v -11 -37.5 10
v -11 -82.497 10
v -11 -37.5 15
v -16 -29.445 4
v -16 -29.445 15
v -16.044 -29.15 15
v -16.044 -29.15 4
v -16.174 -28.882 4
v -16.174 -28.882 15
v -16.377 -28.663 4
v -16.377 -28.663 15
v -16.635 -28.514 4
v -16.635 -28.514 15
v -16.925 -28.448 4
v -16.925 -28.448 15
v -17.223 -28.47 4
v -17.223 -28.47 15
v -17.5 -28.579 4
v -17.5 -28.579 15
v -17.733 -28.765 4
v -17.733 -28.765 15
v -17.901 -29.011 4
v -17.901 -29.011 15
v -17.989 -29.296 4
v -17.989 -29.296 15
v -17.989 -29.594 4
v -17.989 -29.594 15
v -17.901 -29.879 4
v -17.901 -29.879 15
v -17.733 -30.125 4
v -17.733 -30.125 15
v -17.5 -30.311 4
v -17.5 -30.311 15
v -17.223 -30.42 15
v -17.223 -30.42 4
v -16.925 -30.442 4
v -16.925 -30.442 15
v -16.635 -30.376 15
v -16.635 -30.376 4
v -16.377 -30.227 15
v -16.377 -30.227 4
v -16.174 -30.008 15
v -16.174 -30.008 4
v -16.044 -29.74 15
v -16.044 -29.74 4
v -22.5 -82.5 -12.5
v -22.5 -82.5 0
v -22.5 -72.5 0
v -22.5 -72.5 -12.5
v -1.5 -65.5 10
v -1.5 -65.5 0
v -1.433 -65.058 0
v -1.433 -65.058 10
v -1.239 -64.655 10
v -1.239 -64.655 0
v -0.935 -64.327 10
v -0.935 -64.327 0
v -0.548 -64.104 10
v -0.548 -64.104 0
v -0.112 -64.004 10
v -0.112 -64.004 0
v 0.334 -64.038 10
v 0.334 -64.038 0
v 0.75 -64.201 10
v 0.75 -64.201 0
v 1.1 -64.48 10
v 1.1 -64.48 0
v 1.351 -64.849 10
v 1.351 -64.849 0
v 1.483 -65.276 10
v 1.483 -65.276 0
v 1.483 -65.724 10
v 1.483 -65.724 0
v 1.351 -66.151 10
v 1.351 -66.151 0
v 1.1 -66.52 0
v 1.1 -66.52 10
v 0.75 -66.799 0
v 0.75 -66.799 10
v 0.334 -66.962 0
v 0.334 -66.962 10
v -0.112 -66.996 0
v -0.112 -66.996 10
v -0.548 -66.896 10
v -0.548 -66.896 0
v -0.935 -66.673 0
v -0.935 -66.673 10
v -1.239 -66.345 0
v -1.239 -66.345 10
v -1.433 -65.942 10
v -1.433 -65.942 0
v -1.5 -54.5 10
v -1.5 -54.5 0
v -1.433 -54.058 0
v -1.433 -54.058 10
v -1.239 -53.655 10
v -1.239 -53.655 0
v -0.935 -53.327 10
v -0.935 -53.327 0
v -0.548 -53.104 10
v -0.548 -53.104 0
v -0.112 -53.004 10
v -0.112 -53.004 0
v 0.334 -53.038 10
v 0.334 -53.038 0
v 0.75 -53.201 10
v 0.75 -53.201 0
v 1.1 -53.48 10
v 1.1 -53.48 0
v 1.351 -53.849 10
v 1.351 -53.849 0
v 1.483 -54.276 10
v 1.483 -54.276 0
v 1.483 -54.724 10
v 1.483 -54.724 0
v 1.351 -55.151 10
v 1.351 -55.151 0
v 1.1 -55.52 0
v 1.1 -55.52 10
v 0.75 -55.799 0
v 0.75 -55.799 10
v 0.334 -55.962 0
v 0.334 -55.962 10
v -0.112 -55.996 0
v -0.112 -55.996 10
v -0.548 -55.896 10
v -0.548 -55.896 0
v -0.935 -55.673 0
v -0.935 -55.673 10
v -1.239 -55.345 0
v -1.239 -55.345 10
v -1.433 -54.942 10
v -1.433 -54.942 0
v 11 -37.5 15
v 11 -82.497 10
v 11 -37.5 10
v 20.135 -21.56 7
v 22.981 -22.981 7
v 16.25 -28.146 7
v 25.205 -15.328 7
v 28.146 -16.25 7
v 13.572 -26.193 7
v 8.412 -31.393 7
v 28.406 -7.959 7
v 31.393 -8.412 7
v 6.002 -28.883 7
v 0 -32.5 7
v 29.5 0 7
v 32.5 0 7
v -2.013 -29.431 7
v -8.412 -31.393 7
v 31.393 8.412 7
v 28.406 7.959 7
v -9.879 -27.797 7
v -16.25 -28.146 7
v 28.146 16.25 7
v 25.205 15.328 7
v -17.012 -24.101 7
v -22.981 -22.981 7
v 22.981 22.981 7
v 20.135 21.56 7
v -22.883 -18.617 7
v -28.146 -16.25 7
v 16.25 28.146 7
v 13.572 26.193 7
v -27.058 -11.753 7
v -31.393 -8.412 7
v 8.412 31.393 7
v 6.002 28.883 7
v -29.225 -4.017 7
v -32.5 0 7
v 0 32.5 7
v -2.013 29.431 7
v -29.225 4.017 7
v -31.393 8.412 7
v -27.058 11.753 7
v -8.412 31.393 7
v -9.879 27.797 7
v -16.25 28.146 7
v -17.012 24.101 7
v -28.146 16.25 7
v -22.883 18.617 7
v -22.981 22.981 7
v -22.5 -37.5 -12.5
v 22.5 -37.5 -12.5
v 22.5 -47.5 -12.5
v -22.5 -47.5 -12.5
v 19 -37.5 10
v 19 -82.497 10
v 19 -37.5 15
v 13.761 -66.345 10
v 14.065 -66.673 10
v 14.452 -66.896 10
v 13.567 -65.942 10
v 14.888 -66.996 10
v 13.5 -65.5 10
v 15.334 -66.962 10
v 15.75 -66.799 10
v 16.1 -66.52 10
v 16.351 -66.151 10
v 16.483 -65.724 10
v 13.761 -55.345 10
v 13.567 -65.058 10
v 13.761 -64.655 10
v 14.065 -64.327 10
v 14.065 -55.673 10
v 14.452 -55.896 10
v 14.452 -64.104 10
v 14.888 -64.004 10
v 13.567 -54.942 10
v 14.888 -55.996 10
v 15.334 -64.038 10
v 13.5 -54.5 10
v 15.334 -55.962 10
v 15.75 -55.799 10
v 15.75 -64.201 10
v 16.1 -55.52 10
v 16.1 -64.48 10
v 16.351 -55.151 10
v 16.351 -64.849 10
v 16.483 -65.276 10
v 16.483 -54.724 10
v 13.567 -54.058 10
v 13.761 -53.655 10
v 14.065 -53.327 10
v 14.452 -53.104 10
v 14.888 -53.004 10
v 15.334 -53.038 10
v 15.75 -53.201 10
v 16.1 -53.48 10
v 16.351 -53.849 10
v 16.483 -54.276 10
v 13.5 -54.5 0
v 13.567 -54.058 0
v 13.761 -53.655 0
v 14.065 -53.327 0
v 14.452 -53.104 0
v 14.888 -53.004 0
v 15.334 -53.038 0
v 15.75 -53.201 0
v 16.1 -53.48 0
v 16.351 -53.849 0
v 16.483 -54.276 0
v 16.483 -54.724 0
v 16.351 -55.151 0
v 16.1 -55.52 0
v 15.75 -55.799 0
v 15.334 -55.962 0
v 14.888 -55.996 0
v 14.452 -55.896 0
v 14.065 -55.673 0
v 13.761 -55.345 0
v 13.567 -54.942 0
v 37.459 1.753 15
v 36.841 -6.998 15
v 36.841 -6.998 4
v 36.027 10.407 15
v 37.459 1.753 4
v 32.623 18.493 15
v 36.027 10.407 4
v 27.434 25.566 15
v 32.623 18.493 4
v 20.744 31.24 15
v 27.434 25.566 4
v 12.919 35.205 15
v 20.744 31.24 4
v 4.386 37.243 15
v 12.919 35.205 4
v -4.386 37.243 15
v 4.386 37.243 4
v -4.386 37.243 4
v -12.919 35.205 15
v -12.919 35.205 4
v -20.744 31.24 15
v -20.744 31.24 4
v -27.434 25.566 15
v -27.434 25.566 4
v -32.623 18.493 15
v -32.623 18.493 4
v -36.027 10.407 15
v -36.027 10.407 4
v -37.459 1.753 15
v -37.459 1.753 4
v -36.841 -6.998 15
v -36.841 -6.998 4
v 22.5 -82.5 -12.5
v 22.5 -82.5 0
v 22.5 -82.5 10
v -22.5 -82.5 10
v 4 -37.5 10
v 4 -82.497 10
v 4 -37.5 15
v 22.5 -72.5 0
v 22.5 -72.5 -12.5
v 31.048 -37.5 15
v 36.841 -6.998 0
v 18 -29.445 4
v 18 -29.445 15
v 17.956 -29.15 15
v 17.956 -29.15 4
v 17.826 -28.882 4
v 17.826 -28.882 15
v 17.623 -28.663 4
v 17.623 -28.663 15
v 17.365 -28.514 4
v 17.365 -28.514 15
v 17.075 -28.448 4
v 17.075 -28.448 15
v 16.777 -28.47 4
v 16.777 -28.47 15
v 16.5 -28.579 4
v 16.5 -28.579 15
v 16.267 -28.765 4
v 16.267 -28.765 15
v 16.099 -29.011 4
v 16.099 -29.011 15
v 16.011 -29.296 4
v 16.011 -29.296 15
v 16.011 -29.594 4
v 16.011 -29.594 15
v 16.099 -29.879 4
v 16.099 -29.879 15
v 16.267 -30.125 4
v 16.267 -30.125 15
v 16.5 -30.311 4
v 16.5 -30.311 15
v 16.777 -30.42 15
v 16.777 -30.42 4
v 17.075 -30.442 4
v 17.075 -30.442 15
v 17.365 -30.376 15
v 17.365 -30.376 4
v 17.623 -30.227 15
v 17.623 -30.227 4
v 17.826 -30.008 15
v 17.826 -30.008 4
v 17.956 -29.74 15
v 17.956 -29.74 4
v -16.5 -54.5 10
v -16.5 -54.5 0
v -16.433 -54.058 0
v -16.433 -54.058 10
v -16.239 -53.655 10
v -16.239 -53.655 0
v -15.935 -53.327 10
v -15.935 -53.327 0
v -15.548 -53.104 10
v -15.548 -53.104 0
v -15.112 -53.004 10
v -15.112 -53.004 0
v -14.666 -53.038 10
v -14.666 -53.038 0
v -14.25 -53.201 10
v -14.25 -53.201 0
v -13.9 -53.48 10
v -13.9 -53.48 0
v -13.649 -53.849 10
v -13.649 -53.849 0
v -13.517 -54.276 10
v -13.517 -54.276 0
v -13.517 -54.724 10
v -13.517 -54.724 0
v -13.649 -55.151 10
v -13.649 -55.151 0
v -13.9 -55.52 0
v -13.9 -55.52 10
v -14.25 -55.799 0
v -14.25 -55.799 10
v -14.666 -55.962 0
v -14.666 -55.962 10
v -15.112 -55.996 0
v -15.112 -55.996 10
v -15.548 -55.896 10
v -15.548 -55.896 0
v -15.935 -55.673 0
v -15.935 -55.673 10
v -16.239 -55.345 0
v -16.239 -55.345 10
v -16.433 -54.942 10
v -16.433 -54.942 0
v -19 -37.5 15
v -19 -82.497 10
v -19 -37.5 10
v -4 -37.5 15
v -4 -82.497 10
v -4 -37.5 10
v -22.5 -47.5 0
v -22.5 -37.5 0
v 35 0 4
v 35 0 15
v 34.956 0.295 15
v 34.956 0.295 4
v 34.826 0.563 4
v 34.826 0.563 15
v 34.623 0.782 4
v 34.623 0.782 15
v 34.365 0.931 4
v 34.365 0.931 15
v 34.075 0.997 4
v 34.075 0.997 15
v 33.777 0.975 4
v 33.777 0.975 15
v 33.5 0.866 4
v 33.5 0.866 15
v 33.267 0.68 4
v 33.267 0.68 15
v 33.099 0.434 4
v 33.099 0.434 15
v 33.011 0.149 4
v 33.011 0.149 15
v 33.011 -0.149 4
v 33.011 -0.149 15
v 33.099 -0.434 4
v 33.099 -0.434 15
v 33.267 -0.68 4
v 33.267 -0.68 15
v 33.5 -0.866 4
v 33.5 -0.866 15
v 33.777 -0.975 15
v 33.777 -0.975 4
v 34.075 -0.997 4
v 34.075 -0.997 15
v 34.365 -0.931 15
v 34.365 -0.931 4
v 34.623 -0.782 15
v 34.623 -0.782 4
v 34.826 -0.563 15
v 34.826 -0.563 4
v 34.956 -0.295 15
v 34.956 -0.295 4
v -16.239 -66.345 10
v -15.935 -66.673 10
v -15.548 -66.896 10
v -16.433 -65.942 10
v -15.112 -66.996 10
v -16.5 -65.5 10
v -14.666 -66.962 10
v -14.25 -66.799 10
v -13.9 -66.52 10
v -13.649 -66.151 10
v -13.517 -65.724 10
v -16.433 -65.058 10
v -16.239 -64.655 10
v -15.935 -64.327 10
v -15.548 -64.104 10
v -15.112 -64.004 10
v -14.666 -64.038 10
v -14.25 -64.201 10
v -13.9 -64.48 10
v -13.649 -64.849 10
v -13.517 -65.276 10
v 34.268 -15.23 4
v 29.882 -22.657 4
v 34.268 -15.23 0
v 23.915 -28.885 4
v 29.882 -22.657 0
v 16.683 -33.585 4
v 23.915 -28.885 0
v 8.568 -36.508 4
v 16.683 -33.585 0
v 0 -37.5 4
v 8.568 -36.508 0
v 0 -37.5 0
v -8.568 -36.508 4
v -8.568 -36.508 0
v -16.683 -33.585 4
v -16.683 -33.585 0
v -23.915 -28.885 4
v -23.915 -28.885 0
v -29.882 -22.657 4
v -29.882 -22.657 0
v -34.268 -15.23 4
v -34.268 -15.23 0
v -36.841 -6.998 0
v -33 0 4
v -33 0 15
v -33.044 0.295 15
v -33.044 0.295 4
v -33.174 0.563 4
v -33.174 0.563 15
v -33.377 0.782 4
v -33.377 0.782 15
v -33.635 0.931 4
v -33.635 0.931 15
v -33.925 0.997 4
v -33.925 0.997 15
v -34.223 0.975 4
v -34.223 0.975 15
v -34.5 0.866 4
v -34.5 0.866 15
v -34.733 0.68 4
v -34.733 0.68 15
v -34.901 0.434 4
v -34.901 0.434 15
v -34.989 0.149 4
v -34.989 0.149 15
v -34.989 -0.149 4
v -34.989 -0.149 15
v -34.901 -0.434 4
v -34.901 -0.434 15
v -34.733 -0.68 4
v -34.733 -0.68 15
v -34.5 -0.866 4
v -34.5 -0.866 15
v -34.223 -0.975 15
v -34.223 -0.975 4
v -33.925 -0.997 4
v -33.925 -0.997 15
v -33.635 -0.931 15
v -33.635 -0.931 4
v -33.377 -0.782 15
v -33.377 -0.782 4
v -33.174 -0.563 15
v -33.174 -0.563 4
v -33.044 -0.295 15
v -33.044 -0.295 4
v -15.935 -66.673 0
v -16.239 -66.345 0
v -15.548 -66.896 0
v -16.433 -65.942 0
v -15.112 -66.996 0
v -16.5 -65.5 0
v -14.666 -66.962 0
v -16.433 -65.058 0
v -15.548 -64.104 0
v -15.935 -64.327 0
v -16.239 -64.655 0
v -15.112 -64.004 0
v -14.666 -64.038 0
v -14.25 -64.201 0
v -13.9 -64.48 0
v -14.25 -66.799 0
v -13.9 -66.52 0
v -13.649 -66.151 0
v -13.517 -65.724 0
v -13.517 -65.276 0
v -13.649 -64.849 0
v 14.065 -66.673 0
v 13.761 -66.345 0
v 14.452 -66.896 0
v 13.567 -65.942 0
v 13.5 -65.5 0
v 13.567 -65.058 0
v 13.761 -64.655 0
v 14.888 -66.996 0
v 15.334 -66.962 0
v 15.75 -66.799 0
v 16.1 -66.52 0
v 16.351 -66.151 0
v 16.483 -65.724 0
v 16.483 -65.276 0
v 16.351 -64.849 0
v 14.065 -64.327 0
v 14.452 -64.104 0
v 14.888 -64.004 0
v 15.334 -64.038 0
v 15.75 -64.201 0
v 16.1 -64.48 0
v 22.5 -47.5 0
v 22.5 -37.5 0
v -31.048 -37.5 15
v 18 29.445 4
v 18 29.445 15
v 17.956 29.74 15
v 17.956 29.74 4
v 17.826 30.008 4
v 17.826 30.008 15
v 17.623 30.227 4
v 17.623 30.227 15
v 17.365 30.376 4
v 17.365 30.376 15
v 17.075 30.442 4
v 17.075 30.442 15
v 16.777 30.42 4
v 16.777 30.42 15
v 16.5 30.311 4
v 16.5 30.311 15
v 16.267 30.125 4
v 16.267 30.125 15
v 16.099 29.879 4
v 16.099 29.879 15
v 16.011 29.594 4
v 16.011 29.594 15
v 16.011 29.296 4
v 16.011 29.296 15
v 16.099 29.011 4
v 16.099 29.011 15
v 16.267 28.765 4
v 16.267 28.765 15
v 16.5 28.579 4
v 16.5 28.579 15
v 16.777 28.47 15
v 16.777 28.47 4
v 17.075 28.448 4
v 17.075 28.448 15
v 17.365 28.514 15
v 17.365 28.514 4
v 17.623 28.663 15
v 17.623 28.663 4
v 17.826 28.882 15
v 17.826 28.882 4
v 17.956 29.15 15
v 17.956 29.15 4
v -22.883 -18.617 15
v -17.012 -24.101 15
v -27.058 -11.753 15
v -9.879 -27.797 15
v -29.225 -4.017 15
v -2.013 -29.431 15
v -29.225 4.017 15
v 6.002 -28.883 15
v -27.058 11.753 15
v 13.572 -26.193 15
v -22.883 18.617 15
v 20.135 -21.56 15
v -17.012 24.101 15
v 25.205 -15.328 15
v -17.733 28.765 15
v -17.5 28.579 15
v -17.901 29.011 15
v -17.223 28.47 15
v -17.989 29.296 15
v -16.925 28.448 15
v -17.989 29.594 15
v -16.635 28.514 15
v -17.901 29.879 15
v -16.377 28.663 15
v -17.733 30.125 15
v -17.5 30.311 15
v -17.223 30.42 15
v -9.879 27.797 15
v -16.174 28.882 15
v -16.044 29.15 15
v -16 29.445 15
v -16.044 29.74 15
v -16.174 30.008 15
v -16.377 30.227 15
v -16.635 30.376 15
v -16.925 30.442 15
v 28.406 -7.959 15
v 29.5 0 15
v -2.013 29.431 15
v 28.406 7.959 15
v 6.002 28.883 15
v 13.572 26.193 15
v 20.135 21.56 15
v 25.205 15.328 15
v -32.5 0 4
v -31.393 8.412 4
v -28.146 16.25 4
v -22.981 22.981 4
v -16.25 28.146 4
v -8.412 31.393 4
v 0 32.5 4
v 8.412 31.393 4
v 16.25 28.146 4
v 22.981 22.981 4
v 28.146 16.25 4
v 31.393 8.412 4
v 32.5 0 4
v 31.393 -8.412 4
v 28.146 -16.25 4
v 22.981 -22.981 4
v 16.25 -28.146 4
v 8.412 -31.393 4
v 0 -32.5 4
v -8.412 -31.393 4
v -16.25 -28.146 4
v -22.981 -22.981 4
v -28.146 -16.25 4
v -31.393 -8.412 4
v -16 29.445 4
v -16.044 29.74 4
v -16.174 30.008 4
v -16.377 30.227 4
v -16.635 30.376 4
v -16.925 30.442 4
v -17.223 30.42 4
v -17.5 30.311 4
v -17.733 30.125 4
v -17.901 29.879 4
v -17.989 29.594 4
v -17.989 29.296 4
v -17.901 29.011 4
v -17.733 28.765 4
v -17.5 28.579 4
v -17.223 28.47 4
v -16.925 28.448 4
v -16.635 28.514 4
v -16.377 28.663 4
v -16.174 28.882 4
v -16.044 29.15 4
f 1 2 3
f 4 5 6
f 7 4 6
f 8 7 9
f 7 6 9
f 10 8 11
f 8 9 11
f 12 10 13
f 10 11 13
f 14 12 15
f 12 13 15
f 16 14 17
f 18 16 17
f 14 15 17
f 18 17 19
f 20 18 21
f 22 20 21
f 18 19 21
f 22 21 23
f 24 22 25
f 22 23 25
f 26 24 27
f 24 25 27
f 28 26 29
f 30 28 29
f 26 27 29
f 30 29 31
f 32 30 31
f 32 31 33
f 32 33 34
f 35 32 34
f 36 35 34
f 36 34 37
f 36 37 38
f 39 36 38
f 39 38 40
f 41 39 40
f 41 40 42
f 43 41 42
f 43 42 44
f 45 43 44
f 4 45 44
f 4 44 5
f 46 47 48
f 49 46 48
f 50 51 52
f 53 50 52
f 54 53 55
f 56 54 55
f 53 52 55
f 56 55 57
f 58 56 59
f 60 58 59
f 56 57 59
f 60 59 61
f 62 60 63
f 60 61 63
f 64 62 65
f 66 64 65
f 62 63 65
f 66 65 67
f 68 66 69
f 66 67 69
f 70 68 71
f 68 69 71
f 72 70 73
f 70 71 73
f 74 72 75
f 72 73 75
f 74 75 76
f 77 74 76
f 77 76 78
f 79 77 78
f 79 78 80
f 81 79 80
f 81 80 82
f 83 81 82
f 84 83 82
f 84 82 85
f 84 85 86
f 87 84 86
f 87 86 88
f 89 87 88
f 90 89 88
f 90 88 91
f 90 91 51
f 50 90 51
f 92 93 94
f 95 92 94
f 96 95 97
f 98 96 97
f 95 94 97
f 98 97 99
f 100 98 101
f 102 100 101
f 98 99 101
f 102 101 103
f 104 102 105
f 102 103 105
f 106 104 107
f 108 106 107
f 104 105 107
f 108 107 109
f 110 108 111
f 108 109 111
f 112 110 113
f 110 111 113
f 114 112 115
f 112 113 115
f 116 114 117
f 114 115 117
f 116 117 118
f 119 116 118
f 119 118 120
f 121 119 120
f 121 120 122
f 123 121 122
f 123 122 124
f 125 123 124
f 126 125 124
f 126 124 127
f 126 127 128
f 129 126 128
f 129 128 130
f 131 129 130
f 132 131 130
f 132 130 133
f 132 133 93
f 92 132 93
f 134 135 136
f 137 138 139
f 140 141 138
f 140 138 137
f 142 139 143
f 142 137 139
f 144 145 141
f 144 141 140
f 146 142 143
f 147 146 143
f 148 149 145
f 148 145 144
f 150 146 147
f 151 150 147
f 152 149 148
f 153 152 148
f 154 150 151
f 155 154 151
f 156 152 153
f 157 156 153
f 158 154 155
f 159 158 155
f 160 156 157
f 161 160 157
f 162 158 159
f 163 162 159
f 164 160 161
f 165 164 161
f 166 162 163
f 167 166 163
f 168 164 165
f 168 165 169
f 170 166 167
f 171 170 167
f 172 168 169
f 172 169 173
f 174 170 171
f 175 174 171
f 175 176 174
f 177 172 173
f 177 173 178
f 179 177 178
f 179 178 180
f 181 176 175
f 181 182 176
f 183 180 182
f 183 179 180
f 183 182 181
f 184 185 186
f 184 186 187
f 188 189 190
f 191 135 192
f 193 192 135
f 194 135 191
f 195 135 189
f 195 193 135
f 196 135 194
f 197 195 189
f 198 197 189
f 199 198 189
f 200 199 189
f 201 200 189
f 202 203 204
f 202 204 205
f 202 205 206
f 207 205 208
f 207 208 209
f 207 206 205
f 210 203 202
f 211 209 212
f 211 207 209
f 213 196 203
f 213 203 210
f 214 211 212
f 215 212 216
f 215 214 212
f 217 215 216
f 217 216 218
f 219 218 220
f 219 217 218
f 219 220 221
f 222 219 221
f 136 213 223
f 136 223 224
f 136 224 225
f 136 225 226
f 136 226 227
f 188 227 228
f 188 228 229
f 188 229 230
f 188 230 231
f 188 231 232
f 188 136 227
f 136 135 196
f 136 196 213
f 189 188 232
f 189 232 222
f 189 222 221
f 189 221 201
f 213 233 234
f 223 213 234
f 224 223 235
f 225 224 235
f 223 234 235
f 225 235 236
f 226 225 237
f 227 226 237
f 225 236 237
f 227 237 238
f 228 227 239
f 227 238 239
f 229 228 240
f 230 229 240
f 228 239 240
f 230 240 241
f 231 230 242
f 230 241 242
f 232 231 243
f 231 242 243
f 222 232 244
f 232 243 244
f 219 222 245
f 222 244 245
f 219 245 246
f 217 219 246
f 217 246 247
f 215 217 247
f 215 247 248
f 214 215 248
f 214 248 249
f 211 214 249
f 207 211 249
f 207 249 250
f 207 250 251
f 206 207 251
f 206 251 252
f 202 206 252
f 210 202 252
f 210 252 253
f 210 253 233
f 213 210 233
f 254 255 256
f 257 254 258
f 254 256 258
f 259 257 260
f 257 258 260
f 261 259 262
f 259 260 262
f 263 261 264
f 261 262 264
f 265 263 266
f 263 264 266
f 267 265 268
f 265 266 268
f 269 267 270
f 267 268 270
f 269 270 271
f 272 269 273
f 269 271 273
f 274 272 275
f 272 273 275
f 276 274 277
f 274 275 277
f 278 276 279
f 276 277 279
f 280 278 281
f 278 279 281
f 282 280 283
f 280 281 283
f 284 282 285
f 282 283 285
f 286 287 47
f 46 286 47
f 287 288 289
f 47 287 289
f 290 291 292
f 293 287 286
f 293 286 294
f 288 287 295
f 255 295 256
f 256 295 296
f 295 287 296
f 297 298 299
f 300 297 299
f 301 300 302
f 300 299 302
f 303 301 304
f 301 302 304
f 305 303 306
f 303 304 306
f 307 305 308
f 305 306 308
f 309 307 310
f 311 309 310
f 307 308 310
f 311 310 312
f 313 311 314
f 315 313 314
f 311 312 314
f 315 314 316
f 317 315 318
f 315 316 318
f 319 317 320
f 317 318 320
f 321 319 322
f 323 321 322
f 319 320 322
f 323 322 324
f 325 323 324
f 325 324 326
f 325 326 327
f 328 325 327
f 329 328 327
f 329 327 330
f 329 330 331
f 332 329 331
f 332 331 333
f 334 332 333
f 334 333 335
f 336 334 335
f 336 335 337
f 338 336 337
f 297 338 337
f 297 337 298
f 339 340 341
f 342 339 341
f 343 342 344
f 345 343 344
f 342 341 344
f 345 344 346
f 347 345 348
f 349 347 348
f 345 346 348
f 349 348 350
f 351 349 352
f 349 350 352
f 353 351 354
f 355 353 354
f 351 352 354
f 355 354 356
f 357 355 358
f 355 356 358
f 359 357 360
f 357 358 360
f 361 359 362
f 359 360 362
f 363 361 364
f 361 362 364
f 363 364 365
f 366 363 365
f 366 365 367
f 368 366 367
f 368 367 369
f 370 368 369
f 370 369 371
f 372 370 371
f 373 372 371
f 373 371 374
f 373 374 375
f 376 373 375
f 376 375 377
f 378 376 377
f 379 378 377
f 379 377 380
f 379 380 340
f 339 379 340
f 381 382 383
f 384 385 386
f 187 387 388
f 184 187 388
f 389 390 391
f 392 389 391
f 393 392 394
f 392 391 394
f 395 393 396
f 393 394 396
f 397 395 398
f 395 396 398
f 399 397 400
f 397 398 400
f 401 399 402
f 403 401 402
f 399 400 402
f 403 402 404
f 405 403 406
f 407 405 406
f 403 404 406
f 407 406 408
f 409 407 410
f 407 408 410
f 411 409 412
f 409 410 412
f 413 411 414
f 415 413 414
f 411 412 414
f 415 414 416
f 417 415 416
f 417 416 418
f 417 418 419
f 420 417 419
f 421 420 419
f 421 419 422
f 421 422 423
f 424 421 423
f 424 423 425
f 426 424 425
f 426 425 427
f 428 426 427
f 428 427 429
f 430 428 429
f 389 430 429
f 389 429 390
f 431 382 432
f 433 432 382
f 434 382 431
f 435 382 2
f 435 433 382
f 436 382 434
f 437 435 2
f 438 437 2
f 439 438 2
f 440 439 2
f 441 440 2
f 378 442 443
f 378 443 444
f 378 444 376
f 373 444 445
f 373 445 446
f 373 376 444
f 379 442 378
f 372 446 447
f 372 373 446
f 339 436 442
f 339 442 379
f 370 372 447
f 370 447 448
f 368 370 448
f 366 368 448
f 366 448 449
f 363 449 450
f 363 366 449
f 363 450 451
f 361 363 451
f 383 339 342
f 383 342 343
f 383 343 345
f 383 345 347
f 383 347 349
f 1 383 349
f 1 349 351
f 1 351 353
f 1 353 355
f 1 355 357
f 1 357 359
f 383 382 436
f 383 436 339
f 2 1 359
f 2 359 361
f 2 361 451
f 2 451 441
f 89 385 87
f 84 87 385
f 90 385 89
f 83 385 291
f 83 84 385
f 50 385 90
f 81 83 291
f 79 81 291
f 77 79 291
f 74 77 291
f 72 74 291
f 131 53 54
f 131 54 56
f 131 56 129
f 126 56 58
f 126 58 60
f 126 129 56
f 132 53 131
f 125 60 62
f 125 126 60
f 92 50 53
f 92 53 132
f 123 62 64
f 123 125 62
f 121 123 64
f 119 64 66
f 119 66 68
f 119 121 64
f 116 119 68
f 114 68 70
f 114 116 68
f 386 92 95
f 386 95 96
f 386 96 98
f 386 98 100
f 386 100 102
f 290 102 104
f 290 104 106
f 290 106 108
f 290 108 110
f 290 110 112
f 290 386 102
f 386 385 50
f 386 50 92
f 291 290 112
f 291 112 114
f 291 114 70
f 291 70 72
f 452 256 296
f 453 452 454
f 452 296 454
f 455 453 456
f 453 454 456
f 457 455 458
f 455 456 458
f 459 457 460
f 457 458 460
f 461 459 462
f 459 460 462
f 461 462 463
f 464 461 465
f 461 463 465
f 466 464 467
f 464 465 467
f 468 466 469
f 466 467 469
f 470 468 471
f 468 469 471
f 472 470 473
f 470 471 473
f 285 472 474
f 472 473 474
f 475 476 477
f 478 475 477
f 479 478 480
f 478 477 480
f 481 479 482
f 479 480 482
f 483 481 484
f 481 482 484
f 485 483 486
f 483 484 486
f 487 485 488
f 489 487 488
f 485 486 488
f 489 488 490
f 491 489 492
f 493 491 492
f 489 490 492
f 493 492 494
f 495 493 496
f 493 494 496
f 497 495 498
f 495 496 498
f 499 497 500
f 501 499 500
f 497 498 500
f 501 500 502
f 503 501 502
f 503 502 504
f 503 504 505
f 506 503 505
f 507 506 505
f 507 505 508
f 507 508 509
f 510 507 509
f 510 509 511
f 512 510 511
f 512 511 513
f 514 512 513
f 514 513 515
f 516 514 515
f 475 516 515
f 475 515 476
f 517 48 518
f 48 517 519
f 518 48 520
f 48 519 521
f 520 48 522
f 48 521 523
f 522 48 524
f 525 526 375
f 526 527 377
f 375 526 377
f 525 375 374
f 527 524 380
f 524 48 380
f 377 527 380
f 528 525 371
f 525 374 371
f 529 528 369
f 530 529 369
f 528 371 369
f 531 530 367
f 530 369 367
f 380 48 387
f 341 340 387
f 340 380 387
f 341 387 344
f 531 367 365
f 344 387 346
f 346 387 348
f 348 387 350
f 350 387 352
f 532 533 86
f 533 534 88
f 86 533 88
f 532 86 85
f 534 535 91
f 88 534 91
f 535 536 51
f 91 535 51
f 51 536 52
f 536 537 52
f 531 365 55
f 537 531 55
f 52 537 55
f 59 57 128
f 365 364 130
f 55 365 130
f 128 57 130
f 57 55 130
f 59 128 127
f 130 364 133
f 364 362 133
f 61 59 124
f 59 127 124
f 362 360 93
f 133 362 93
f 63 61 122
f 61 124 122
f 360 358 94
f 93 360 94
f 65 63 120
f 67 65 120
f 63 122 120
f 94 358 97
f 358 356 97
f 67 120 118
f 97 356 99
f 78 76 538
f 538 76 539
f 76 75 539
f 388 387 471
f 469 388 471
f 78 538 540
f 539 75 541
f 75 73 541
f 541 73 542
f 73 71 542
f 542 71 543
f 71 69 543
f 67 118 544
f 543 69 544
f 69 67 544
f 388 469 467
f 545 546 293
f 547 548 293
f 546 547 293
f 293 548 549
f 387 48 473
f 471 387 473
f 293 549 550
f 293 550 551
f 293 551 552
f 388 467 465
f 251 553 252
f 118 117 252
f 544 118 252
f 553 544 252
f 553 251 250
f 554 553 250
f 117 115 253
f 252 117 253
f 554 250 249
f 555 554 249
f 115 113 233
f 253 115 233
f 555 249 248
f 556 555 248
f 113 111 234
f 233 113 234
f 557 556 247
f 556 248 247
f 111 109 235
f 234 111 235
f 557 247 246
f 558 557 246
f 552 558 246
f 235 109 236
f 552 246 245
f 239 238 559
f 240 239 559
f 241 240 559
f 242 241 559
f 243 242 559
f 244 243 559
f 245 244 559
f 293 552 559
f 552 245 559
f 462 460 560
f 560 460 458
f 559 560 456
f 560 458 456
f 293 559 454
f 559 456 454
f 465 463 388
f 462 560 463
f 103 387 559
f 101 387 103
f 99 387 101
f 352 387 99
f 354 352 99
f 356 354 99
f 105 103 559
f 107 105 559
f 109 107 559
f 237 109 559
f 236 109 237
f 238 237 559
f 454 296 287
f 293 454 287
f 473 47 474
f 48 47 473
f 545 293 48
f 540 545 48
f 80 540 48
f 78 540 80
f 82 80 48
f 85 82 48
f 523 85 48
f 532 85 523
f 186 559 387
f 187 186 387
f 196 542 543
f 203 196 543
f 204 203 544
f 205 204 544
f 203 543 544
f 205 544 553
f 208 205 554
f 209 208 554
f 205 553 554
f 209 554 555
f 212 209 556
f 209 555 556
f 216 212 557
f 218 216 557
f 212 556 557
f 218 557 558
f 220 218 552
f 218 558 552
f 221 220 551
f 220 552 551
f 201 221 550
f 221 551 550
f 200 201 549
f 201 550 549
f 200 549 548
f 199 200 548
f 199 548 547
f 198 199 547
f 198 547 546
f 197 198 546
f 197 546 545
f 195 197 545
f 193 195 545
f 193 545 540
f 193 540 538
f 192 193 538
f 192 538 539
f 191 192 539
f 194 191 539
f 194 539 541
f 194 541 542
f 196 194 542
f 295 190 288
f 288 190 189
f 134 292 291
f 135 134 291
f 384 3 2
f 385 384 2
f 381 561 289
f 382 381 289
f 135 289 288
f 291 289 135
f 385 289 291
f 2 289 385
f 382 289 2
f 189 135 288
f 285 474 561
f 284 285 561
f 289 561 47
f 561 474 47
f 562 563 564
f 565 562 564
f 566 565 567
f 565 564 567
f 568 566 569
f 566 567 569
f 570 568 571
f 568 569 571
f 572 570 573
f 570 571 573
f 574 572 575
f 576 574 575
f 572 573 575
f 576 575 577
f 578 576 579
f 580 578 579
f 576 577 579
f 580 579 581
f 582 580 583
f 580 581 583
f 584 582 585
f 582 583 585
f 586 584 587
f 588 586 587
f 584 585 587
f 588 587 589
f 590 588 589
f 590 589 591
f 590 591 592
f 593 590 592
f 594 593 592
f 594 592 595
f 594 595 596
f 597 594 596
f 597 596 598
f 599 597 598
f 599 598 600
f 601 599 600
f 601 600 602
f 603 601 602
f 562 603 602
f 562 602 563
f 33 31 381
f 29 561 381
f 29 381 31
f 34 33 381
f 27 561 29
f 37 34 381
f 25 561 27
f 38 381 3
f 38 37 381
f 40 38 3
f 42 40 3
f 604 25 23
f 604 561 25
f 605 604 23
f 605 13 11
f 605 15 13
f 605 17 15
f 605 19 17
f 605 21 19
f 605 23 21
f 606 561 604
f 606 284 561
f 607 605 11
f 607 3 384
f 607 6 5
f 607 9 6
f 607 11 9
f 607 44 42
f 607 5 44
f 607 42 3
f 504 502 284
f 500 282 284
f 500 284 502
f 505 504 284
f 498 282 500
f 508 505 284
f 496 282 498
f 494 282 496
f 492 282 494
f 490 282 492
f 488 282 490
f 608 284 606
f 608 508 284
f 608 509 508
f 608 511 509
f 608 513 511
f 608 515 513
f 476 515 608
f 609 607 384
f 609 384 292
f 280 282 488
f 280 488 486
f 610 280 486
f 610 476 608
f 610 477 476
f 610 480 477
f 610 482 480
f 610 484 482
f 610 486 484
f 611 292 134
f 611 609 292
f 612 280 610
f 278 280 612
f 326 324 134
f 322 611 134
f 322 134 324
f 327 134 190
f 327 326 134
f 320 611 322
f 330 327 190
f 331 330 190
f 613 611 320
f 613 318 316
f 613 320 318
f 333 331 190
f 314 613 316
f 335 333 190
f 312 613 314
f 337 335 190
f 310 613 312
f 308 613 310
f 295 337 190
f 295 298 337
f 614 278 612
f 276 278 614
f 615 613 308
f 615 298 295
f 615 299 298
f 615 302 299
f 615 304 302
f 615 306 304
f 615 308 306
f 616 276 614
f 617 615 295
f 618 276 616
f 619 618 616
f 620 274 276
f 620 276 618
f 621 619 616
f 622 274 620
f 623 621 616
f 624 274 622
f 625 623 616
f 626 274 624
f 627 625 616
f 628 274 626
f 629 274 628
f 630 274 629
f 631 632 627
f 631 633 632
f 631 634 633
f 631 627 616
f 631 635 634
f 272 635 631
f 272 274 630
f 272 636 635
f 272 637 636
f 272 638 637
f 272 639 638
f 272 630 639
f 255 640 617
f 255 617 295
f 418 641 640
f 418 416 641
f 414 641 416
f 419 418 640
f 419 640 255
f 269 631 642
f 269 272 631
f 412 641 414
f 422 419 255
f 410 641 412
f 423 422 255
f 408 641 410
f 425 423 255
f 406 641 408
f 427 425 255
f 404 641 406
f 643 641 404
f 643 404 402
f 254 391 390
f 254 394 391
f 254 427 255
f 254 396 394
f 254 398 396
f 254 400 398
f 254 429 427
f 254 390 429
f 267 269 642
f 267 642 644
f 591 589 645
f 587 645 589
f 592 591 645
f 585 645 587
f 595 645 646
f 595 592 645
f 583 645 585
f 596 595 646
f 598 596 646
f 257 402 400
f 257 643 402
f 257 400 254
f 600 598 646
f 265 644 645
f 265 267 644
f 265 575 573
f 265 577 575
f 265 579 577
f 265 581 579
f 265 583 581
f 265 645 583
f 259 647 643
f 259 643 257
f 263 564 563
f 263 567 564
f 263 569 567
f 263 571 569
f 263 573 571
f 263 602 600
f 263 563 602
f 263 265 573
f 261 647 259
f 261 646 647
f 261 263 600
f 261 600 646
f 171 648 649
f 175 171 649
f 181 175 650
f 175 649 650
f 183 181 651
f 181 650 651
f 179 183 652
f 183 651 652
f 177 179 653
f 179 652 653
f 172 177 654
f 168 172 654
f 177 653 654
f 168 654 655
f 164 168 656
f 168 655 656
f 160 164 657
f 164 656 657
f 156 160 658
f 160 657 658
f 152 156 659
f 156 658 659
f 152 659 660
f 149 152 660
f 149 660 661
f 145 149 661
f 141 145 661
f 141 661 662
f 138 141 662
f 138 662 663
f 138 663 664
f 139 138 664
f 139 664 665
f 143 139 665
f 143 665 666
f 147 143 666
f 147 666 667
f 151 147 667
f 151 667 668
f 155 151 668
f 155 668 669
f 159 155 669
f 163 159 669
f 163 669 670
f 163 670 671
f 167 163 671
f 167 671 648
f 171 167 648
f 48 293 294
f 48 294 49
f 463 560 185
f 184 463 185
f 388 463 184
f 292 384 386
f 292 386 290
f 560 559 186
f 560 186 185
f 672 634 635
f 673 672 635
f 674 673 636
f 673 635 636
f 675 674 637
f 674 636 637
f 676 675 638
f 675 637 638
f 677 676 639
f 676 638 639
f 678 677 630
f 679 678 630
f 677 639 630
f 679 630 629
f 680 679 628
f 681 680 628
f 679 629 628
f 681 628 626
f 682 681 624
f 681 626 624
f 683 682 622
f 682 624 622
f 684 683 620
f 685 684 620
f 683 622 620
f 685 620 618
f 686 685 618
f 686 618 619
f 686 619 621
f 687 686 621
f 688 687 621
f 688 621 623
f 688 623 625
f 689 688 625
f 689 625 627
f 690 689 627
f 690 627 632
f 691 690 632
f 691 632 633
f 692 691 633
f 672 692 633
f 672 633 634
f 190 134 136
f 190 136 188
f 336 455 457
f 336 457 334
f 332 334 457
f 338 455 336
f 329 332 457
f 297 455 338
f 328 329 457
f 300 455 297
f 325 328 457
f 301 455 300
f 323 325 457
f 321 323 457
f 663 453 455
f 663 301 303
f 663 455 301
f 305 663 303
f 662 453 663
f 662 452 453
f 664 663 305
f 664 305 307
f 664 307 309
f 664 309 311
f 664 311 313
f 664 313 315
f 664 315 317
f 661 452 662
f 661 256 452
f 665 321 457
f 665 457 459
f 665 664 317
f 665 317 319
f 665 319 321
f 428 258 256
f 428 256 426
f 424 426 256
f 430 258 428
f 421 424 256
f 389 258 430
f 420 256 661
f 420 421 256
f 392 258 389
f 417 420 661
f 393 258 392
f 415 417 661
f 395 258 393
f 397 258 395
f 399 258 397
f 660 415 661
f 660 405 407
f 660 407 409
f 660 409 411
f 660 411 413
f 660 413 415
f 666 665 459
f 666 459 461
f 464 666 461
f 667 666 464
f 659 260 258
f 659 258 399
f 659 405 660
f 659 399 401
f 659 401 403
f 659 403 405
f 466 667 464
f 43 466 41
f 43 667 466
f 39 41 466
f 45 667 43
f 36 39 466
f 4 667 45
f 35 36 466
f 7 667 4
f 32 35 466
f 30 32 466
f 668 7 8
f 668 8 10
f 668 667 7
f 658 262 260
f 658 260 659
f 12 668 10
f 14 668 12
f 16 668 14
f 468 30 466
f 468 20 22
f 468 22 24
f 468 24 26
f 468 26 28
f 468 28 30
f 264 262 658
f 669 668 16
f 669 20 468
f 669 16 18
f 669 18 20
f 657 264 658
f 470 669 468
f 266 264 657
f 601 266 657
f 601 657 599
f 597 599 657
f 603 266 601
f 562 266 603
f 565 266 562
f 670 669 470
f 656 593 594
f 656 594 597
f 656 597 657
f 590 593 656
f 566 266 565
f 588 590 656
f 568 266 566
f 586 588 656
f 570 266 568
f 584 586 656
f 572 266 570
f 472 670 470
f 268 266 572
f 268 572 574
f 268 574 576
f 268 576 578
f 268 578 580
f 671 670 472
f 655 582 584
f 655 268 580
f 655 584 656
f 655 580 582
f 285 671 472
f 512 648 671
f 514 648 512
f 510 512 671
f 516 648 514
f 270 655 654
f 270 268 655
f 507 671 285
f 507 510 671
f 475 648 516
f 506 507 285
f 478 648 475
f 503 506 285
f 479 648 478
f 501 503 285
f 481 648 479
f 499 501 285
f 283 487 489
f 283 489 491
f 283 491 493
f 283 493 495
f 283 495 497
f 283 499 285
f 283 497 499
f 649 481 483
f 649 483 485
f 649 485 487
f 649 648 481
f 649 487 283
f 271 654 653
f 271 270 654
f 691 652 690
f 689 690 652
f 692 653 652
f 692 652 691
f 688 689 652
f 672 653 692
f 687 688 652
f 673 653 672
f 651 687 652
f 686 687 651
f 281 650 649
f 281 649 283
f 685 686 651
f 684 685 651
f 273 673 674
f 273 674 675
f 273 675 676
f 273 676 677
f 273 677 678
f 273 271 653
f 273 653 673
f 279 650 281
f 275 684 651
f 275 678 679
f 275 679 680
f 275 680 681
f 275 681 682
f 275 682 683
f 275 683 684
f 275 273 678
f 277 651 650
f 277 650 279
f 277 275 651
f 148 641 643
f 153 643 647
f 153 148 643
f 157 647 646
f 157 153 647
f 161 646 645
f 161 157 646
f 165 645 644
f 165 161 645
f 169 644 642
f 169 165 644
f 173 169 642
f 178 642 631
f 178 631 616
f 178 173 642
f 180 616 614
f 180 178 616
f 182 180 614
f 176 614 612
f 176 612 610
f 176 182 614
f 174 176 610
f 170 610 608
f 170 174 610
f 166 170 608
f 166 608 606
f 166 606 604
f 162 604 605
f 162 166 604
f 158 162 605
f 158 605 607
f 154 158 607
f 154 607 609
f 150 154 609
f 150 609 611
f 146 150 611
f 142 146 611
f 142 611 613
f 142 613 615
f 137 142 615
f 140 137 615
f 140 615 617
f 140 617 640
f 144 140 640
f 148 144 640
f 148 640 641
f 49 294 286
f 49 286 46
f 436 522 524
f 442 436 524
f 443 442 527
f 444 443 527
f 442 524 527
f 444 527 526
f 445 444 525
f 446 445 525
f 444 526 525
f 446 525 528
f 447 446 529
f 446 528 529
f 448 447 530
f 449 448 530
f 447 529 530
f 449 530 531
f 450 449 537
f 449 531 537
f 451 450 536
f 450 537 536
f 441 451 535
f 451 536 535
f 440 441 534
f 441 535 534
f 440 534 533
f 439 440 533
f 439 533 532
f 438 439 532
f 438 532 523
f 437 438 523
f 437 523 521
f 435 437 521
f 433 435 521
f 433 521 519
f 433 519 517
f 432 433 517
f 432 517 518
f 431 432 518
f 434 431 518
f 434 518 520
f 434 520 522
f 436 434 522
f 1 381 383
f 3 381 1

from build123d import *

# Parameters (mm, degrees)
SKETCH1_R               = 37.5
SKETCH1_R_2             = 29.5
BOSS_EXTRUDE1_DEPTH     = 15
SKETCH2_R               = 32.5
SKETCH2_R_2             = 27.5
CUT_EXTRUDE1_DEPTH      = 7
SKETCH9_R               = 1
CUT_EXTRUDE5_DEPTH      = 15
SKETCH10_R              = 37.5
CUT_EXTRUDE6_DEPTH      = 4
SKETCH7_W               = 45
SKETCH7_H               = 10
BOSS_EXTRUDE3_DEPTH     = 12.5
SKETCH12_R              = 1.5
CUT_EXTRUDE8_DEPTH      = 15
CUT_EXTRUDE9_DEPTH      = 35
CUT_EXTRUDE9_DEPTH_BACK = 35
SKETCH14_W              = 8
SKETCH14_H              = 44.996878368
CUT_EXTRUDE10_DEPTH     = 5


with BuildPart() as part:
    # Sketch1 → Boss-Extrude1 (new body)
    # profile 1 of 2: a face of its own
    with BuildSketch(Plane.XY):
        Circle(SKETCH1_R)
        Circle(SKETCH1_R_2, mode=Mode.SUBTRACT)
    # profile 2 of 2: a face of its own
    with BuildSketch(Plane.XY):
        with BuildLine():
            Line((-22.5, -82.5), (22.5, -82.5))
            Line((22.5, -82.5), (36.841286084, -6.997831068))
            ThreePointArc((36.841286084, -6.997831068), (0, -37.5), (-36.841286084, -6.997831068))
            Line((-36.841286084, -6.997831068), (-22.5, -82.5))
        make_face()
    extrude(amount=BOSS_EXTRUDE1_DEPTH)

    # Sketch2 → Cut-Extrude1 (cut)
    with BuildSketch(Plane(origin=(0, 0, 0), x_dir=(-1, 0, 0), z_dir=(0, 0, -1))):
        Circle(SKETCH2_R)
        Circle(SKETCH2_R_2, mode=Mode.SUBTRACT)
    extrude(amount=-CUT_EXTRUDE1_DEPTH, mode=Mode.SUBTRACT)

    # Sketch9 → Cut-Extrude5 (cut)
    with BuildSketch(Plane.XY.offset(15)):
        with Locations((17, 29.444863729)):
            Circle(SKETCH9_R)
        with Locations((34, 0)):
            Circle(SKETCH9_R)
        with Locations((17, -29.444863729)):
            Circle(SKETCH9_R)
        with Locations((-17, -29.444863729)):
            Circle(SKETCH9_R)
        with Locations((-34, 0)):
            Circle(SKETCH9_R)
        with Locations((-17, 29.444863729)):
            Circle(SKETCH9_R)
    extrude(amount=-CUT_EXTRUDE5_DEPTH, mode=Mode.SUBTRACT)

    # Sketch10 → Cut-Extrude6 (cut)
    with BuildSketch(Plane(origin=(0, 0, 0), x_dir=(-1, 0, 0), z_dir=(0, 0, -1))):
        Circle(SKETCH10_R)
    extrude(amount=-CUT_EXTRUDE6_DEPTH, mode=Mode.SUBTRACT)

    # Sketch7 → Boss-Extrude3 (add)
    with BuildSketch(Plane(origin=(0, 0, 0), x_dir=(-1, 0, 0), z_dir=(0, 0, -1))):
        with Locations((0, -77.5)):
            Rectangle(SKETCH7_W, SKETCH7_H)
        with Locations((0, -42.5)):
            Rectangle(SKETCH7_W, SKETCH7_H)
    extrude(amount=BOSS_EXTRUDE3_DEPTH)

    # Sketch12 → Cut-Extrude8 (cut)
    with BuildSketch(Plane(origin=(0, 0, 0), x_dir=(-1, 0, 0), z_dir=(0, 0, -1))):
        with Locations((-15, -54.5)):
            Circle(SKETCH12_R)
        with Locations((0, -54.5)):
            Circle(SKETCH12_R)
        with Locations((15, -54.5)):
            Circle(SKETCH12_R)
        with Locations((-15, -65.5)):
            Circle(SKETCH12_R)
        with Locations((0, -65.5)):
            Circle(SKETCH12_R)
        with Locations((15, -65.5)):
            Circle(SKETCH12_R)
    extrude(amount=-CUT_EXTRUDE8_DEPTH, mode=Mode.SUBTRACT)

    # Sketch13 → Cut-Extrude9 (cut, two sides: drawn at the far end of the back side and taken through both)
    with BuildSketch(Plane(origin=(0, 0, 0), x_dir=(0, 0, -1), z_dir=(1, 0, 0)).offset(-CUT_EXTRUDE9_DEPTH_BACK)):
        Polygon((-15, -82.5), (-15, -37.5), (-10, -82.5), align=None)
    extrude(amount=CUT_EXTRUDE9_DEPTH + CUT_EXTRUDE9_DEPTH_BACK, mode=Mode.SUBTRACT)

    # Sketch14 → Cut-Extrude10 (cut)
    with BuildSketch(Plane.XY.offset(15)):
        with Locations((-15, -59.998439184)):
            Rectangle(SKETCH14_W, SKETCH14_H)
        with Locations((15, -59.998439184)):
            Rectangle(SKETCH14_W, SKETCH14_H)
        with Locations((0, -59.998439184)):
            Rectangle(SKETCH14_W, SKETCH14_H)
    extrude(amount=-CUT_EXTRUDE10_DEPTH, mode=Mode.SUBTRACT)


solid = part.part
